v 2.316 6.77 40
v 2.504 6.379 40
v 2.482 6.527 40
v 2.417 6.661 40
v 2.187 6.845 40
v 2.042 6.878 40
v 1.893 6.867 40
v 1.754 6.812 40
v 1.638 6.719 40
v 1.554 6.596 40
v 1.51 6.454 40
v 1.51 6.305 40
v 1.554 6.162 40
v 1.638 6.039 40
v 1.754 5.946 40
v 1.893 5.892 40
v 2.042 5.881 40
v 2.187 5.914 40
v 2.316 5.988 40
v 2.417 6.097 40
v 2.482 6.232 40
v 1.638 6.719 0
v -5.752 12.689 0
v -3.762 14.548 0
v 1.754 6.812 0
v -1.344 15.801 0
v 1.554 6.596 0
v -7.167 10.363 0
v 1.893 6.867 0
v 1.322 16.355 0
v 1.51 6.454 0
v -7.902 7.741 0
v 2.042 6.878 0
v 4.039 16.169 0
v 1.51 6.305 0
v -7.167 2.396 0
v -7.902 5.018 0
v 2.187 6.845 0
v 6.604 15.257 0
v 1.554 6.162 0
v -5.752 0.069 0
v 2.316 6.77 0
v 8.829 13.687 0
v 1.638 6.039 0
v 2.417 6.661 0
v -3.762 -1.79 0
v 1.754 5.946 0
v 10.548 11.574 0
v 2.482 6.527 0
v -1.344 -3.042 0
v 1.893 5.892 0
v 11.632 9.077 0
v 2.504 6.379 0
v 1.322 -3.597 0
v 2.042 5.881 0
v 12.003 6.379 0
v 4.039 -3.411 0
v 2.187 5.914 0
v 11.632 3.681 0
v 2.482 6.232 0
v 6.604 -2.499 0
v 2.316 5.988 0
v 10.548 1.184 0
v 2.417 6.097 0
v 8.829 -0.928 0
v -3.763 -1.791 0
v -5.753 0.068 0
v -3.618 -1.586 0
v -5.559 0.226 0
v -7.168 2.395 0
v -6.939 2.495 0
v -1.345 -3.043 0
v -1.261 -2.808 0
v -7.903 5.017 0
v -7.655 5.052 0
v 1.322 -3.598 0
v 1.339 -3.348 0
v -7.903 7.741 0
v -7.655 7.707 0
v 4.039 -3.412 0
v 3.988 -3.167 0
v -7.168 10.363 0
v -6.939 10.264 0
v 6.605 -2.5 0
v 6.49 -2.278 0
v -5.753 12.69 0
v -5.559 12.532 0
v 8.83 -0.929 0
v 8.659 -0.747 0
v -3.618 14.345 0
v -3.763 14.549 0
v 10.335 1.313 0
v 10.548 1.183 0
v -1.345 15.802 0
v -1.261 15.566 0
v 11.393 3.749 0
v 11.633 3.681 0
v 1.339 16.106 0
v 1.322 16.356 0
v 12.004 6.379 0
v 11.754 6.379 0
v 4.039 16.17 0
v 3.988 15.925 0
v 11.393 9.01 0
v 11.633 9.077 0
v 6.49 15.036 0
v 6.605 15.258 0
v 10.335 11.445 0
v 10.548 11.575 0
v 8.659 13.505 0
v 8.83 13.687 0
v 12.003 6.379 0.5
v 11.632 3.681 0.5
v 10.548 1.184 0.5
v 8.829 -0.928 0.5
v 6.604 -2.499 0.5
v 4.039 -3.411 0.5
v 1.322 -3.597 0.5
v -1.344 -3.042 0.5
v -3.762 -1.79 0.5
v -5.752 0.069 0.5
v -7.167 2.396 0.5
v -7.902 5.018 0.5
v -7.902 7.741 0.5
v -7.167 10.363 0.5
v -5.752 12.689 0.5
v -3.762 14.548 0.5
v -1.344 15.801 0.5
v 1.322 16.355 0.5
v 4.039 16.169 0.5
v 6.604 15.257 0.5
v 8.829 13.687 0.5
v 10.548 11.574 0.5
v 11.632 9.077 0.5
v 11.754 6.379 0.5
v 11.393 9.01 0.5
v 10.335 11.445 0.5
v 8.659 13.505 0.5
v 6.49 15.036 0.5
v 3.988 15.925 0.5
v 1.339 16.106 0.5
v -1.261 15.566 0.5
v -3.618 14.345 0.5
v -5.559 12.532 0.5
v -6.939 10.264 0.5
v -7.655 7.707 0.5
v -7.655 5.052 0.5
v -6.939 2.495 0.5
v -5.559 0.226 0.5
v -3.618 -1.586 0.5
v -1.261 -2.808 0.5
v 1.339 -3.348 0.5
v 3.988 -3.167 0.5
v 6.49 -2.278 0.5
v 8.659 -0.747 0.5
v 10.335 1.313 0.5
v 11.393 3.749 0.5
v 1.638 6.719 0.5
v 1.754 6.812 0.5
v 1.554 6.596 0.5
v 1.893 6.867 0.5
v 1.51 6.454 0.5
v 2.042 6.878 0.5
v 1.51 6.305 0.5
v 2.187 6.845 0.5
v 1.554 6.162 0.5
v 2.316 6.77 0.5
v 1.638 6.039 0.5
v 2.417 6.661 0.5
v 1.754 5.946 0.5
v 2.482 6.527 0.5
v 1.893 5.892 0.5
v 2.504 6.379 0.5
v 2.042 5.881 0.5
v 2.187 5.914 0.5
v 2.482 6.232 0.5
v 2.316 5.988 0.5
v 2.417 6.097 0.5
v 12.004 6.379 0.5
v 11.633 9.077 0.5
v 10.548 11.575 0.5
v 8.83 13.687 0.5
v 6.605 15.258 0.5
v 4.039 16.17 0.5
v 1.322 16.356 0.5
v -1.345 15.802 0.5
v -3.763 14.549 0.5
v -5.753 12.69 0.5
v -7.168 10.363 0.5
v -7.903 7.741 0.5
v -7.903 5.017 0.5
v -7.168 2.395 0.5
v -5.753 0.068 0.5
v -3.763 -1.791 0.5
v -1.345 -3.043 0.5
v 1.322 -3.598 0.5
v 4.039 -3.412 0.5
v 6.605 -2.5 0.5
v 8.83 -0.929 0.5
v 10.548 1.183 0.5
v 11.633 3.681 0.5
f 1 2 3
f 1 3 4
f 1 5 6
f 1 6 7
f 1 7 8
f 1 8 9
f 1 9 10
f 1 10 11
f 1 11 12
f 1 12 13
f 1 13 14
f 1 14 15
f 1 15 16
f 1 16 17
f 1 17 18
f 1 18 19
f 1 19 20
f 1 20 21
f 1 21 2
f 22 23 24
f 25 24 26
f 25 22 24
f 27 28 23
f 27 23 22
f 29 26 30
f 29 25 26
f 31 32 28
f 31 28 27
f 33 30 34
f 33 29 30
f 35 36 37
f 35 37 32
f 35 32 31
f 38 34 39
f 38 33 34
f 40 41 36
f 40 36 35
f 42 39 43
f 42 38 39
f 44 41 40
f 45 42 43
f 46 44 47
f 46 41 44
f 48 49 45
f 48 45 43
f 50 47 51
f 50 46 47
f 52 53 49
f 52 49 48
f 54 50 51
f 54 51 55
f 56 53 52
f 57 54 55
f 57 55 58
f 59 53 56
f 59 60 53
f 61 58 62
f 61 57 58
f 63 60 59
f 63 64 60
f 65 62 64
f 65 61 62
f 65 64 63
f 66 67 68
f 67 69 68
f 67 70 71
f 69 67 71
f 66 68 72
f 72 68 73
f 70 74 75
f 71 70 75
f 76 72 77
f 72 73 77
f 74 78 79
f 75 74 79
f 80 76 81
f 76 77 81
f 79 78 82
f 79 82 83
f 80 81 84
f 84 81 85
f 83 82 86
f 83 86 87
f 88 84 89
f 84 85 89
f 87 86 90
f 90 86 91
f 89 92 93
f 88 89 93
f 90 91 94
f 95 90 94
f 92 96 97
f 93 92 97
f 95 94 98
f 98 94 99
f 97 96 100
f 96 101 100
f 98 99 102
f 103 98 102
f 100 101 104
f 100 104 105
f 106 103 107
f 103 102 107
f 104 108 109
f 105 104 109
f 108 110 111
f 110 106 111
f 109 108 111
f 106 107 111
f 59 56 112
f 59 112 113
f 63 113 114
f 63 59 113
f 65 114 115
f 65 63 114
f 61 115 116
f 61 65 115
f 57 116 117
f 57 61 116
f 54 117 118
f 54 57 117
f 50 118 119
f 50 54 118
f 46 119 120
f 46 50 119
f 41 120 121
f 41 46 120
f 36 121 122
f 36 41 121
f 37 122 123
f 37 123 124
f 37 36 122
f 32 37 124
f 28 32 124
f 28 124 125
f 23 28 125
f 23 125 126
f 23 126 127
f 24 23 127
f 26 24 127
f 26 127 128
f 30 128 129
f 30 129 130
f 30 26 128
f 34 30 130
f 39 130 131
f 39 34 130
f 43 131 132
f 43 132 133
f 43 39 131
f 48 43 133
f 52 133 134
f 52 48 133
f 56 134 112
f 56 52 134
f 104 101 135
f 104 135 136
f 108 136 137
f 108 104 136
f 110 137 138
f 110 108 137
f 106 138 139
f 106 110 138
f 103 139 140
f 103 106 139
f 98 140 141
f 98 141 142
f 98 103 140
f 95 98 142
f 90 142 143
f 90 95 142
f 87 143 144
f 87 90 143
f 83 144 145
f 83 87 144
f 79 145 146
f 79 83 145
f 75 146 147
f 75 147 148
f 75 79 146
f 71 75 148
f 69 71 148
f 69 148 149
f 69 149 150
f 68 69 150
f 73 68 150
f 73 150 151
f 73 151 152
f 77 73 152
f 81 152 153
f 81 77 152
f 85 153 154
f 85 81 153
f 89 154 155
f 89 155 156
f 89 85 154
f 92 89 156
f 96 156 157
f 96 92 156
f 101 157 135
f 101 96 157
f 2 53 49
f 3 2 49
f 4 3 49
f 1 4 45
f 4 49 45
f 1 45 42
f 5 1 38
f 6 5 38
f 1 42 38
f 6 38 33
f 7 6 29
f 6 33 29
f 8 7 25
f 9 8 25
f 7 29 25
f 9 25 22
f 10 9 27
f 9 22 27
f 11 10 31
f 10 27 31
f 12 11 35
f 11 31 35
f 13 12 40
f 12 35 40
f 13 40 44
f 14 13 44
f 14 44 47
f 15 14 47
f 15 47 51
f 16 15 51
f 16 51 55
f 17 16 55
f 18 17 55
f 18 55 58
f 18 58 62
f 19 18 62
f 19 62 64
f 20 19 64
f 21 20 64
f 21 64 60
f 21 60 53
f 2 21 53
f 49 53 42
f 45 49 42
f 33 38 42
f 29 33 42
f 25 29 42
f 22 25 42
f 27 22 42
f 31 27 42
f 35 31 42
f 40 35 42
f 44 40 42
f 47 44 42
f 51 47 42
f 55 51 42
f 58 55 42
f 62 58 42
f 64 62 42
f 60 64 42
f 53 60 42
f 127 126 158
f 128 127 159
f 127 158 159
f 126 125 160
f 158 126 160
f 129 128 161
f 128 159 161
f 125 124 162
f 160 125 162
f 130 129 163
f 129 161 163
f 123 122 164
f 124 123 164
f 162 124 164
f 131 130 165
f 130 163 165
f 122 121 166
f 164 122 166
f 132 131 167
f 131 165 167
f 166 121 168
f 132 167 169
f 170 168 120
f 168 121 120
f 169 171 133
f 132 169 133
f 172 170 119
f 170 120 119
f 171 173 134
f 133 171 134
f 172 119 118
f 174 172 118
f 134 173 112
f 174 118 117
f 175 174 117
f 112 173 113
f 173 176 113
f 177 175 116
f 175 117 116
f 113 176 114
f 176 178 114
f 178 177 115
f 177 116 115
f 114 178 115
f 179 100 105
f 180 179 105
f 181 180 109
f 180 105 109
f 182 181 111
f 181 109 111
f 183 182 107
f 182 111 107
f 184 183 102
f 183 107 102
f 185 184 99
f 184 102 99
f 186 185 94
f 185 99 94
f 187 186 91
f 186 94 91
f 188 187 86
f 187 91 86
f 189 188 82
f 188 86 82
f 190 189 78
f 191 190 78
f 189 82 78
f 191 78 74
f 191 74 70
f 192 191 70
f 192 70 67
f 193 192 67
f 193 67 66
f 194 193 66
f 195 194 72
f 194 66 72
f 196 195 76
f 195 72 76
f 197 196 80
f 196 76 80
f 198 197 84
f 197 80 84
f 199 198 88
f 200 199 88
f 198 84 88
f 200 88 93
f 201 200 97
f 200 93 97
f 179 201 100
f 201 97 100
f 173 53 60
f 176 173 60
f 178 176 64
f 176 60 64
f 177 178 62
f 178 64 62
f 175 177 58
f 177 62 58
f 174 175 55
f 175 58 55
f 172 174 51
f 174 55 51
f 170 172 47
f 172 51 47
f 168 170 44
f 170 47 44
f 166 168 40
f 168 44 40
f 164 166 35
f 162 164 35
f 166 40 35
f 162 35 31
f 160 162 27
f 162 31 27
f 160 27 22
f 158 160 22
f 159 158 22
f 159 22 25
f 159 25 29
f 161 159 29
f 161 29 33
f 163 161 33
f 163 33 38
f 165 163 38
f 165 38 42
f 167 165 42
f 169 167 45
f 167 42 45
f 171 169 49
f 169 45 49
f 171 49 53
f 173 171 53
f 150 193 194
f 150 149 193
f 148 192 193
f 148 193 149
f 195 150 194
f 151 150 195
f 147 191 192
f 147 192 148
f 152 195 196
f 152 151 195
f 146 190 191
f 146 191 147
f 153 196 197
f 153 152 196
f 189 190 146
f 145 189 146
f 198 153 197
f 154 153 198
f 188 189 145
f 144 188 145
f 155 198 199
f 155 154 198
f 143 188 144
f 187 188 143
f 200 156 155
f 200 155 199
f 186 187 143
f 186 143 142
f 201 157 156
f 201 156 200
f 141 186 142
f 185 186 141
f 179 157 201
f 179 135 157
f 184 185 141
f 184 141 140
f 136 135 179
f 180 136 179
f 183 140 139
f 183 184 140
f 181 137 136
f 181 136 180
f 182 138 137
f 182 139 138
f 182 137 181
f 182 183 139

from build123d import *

# Parameters (mm, degrees)
F0_R     = 0.5
F1_DEPTH = 42.5
F0_R_2   = 10
F0_R_3   = 9.75
F2_DEPTH = 0.5
F3_R     = 9.9989455161
F3_R_2   = 0.5
F4_DEPTH = 0.5
F5_DEPTH = 0.05
F6_DEPTH = 0.06
F7_DEPTH = 2.5


with BuildPart() as f1:
    # F0 (on Top) → F1 (new body)
    with BuildSketch(Plane.XY):
        with Locations((2.0042229444, 6.3791351343)):
            Circle(F0_R)
    extrude(amount=F1_DEPTH)

    # F7 (cut): a face of the model
    f7_faces = [f1.faces().sort_by_distance(p)[0] for p in [
        (2.0042229444, 6.3791351343, 42.5),
    ]]
    extrude(f7_faces, amount=-F7_DEPTH, mode=Mode.SUBTRACT)


with BuildPart() as f2:
    # F0 (on Top) → F2 (new body)
    with BuildSketch(Plane.XY):
        with Locations((2.0042229444, 6.3791351343)):
            Circle(F0_R_2)
        with Locations((2.0042229444, 6.3791351343)):
            Circle(F0_R_3, mode=Mode.SUBTRACT)
    extrude(amount=F2_DEPTH)


with BuildPart() as f4:
    # F3 (on face) → F4 (new body)
    with BuildSketch(Plane(origin=(0, 0, 0), x_dir=(1, 0, 0), z_dir=(0, 0, -1))):
        with Locations((2.0042229444, -6.3791351343)):
            Circle(F3_R)
        with Locations((2.0042229444, -6.3791351343)):
            Circle(F3_R_2, mode=Mode.SUBTRACT)
    extrude(amount=-F4_DEPTH)


with BuildPart() as f5:
    # F5 (new): a face of the model
    f5_faces = [f4.part.faces().sort_by_distance(p)[0] for p in [
        (-7.7119096846, 6.3791351343, 0),
    ]]
    extrude(f5_faces, amount=F5_DEPTH)

    # F6 (cut): a face of the model
    f6_faces = [f5.faces().sort_by_distance(p)[0] for p in [
        (-7.7119096846, 6.3791351343, -0.05),
    ]]
    extrude(f6_faces, amount=-F6_DEPTH, mode=Mode.SUBTRACT)


solid = Compound([f1.part, f2.part, f4.part])
